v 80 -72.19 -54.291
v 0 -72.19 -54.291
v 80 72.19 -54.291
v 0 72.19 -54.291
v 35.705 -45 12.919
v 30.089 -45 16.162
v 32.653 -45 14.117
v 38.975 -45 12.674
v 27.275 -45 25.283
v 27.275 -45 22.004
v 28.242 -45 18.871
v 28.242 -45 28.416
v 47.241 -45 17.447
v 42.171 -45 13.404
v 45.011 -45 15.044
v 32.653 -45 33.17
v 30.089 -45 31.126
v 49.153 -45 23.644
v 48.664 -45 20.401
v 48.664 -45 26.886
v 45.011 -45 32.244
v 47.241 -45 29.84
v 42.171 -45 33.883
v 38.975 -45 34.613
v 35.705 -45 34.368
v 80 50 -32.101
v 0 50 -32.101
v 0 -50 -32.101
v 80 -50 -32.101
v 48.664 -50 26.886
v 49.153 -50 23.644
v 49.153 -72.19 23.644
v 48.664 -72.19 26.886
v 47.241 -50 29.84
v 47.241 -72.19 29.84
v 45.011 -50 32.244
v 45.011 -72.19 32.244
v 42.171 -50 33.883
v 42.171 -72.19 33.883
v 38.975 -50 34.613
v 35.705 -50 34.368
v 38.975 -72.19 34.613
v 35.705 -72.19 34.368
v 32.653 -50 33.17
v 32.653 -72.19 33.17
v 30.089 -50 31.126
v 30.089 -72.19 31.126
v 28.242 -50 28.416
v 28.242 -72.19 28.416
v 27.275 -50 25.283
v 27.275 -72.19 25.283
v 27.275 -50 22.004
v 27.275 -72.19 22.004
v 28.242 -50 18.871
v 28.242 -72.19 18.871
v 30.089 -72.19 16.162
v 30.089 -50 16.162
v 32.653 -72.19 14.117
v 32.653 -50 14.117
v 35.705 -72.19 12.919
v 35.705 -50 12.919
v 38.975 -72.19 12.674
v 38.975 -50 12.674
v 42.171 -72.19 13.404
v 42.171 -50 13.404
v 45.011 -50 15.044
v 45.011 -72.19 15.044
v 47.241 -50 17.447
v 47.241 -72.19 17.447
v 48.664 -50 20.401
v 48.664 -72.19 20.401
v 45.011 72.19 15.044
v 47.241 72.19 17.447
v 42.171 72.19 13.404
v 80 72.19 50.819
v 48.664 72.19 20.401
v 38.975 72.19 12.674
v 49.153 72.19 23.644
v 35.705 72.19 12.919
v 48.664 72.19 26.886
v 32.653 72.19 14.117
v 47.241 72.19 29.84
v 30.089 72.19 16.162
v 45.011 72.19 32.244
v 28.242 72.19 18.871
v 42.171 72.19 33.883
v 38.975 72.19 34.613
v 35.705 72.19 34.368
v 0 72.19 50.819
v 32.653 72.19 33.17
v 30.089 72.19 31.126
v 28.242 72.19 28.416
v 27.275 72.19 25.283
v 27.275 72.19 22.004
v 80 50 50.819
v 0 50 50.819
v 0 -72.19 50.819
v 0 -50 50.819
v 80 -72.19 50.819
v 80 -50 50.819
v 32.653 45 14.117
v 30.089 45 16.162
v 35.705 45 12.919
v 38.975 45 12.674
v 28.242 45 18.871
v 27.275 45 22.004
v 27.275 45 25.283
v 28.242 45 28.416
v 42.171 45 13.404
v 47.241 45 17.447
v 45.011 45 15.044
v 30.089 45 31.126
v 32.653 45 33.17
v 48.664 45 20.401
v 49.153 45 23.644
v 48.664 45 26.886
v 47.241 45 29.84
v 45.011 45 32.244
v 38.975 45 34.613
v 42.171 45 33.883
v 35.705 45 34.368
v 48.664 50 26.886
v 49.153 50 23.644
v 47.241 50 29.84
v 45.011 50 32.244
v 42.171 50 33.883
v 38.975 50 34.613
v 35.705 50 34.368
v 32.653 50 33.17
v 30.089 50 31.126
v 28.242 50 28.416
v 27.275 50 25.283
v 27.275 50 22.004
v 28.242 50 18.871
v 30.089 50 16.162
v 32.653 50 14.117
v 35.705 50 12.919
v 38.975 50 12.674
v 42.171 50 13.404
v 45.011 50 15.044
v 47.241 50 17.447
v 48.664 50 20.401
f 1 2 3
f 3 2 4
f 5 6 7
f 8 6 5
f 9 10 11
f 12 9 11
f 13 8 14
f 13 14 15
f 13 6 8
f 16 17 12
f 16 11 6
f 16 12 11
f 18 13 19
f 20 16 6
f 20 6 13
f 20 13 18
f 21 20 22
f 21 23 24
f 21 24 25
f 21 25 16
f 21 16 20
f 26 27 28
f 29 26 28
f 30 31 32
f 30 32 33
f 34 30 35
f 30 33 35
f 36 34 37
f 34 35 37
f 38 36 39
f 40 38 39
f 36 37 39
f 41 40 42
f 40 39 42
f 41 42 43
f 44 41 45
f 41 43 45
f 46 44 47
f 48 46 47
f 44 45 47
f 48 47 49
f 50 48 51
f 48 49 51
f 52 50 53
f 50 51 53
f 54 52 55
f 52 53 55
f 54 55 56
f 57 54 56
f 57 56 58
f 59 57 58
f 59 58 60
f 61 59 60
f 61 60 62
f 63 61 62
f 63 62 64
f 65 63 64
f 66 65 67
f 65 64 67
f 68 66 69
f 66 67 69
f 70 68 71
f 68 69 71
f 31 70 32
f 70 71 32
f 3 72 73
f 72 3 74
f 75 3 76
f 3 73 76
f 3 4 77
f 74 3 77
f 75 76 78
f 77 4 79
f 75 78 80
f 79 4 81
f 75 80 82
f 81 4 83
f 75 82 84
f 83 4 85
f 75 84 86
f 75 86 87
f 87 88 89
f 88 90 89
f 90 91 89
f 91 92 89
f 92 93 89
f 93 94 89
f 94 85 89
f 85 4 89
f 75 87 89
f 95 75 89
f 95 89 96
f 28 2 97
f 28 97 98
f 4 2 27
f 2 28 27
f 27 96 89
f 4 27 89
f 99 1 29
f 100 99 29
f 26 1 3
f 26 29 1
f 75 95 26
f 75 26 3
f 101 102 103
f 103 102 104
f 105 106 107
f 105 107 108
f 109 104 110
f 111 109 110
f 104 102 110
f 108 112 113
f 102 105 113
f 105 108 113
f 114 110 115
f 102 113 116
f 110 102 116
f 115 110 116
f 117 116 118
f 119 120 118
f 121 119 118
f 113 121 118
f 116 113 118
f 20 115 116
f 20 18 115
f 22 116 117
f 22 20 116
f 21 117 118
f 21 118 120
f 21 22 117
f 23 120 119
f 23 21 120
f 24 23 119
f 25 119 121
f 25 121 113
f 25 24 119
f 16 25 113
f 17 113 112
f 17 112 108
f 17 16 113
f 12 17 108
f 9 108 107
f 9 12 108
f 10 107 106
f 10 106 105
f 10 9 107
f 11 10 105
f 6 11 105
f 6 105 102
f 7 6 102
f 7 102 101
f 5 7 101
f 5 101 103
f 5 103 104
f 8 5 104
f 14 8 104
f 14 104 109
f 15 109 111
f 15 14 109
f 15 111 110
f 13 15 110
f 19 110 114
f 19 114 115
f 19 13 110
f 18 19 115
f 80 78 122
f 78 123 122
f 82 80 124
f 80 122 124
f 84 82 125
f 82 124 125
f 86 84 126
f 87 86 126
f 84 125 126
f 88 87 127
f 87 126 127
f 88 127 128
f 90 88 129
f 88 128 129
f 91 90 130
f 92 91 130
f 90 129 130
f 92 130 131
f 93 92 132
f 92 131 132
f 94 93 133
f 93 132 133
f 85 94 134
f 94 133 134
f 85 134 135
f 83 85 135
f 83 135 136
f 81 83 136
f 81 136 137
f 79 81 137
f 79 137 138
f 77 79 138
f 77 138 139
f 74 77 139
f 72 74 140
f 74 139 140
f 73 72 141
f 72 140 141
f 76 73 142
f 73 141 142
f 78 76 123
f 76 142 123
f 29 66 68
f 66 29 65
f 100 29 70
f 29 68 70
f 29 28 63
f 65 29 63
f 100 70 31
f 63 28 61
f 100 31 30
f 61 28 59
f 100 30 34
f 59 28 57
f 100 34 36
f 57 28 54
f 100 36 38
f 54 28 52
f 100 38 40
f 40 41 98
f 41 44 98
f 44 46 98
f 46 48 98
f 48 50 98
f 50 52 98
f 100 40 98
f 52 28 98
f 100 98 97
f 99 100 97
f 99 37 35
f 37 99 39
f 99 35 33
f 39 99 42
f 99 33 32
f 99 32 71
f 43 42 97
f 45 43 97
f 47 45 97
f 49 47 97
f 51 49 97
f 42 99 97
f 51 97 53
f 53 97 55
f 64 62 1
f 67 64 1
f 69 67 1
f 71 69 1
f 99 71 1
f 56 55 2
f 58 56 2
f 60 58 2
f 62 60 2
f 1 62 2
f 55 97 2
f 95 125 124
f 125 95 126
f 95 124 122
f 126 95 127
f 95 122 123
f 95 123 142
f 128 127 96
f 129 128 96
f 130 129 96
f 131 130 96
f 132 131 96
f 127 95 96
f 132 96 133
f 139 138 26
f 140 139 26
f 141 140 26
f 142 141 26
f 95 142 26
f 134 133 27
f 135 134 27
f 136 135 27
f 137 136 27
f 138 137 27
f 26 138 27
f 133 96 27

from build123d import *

# Parameters (mm, degrees)
F1_DEPTH = 80
F2_R     = 11
F3_DEPTH = 75
F4_DEPTH = 45


with BuildPart() as f1:
    # F0 (on Right) → F1 (new body)
    with BuildSketch(Plane.YZ):
        Polygon((-50, -32.101312), (-50, 50.818503), (-72.189736, 50.818503), (-72.189736, -54.291049), (72.189736, -54.291049), (72.189736, 50.818503), (50, 50.818503), (50, -32.101312), align=None)
    extrude(amount=F1_DEPTH)

    # F2 (on Front) → F3 (cut, symmetric)
    with BuildSketch(Plane.XZ):
        with Locations((38.152507, 23.643674)):
            Circle(F2_R)
    extrude(amount=F3_DEPTH, both=True, mode=Mode.SUBTRACT)


with BuildPart() as f4:
    # F2 (on Front) → F4 (new body, symmetric)
    with BuildSketch(Plane.XZ):
        with Locations((38.152507, 23.643674)):
            Circle(F2_R)
    extrude(amount=F4_DEPTH, both=True)


solid = Compound([f1.part, f4.part])
